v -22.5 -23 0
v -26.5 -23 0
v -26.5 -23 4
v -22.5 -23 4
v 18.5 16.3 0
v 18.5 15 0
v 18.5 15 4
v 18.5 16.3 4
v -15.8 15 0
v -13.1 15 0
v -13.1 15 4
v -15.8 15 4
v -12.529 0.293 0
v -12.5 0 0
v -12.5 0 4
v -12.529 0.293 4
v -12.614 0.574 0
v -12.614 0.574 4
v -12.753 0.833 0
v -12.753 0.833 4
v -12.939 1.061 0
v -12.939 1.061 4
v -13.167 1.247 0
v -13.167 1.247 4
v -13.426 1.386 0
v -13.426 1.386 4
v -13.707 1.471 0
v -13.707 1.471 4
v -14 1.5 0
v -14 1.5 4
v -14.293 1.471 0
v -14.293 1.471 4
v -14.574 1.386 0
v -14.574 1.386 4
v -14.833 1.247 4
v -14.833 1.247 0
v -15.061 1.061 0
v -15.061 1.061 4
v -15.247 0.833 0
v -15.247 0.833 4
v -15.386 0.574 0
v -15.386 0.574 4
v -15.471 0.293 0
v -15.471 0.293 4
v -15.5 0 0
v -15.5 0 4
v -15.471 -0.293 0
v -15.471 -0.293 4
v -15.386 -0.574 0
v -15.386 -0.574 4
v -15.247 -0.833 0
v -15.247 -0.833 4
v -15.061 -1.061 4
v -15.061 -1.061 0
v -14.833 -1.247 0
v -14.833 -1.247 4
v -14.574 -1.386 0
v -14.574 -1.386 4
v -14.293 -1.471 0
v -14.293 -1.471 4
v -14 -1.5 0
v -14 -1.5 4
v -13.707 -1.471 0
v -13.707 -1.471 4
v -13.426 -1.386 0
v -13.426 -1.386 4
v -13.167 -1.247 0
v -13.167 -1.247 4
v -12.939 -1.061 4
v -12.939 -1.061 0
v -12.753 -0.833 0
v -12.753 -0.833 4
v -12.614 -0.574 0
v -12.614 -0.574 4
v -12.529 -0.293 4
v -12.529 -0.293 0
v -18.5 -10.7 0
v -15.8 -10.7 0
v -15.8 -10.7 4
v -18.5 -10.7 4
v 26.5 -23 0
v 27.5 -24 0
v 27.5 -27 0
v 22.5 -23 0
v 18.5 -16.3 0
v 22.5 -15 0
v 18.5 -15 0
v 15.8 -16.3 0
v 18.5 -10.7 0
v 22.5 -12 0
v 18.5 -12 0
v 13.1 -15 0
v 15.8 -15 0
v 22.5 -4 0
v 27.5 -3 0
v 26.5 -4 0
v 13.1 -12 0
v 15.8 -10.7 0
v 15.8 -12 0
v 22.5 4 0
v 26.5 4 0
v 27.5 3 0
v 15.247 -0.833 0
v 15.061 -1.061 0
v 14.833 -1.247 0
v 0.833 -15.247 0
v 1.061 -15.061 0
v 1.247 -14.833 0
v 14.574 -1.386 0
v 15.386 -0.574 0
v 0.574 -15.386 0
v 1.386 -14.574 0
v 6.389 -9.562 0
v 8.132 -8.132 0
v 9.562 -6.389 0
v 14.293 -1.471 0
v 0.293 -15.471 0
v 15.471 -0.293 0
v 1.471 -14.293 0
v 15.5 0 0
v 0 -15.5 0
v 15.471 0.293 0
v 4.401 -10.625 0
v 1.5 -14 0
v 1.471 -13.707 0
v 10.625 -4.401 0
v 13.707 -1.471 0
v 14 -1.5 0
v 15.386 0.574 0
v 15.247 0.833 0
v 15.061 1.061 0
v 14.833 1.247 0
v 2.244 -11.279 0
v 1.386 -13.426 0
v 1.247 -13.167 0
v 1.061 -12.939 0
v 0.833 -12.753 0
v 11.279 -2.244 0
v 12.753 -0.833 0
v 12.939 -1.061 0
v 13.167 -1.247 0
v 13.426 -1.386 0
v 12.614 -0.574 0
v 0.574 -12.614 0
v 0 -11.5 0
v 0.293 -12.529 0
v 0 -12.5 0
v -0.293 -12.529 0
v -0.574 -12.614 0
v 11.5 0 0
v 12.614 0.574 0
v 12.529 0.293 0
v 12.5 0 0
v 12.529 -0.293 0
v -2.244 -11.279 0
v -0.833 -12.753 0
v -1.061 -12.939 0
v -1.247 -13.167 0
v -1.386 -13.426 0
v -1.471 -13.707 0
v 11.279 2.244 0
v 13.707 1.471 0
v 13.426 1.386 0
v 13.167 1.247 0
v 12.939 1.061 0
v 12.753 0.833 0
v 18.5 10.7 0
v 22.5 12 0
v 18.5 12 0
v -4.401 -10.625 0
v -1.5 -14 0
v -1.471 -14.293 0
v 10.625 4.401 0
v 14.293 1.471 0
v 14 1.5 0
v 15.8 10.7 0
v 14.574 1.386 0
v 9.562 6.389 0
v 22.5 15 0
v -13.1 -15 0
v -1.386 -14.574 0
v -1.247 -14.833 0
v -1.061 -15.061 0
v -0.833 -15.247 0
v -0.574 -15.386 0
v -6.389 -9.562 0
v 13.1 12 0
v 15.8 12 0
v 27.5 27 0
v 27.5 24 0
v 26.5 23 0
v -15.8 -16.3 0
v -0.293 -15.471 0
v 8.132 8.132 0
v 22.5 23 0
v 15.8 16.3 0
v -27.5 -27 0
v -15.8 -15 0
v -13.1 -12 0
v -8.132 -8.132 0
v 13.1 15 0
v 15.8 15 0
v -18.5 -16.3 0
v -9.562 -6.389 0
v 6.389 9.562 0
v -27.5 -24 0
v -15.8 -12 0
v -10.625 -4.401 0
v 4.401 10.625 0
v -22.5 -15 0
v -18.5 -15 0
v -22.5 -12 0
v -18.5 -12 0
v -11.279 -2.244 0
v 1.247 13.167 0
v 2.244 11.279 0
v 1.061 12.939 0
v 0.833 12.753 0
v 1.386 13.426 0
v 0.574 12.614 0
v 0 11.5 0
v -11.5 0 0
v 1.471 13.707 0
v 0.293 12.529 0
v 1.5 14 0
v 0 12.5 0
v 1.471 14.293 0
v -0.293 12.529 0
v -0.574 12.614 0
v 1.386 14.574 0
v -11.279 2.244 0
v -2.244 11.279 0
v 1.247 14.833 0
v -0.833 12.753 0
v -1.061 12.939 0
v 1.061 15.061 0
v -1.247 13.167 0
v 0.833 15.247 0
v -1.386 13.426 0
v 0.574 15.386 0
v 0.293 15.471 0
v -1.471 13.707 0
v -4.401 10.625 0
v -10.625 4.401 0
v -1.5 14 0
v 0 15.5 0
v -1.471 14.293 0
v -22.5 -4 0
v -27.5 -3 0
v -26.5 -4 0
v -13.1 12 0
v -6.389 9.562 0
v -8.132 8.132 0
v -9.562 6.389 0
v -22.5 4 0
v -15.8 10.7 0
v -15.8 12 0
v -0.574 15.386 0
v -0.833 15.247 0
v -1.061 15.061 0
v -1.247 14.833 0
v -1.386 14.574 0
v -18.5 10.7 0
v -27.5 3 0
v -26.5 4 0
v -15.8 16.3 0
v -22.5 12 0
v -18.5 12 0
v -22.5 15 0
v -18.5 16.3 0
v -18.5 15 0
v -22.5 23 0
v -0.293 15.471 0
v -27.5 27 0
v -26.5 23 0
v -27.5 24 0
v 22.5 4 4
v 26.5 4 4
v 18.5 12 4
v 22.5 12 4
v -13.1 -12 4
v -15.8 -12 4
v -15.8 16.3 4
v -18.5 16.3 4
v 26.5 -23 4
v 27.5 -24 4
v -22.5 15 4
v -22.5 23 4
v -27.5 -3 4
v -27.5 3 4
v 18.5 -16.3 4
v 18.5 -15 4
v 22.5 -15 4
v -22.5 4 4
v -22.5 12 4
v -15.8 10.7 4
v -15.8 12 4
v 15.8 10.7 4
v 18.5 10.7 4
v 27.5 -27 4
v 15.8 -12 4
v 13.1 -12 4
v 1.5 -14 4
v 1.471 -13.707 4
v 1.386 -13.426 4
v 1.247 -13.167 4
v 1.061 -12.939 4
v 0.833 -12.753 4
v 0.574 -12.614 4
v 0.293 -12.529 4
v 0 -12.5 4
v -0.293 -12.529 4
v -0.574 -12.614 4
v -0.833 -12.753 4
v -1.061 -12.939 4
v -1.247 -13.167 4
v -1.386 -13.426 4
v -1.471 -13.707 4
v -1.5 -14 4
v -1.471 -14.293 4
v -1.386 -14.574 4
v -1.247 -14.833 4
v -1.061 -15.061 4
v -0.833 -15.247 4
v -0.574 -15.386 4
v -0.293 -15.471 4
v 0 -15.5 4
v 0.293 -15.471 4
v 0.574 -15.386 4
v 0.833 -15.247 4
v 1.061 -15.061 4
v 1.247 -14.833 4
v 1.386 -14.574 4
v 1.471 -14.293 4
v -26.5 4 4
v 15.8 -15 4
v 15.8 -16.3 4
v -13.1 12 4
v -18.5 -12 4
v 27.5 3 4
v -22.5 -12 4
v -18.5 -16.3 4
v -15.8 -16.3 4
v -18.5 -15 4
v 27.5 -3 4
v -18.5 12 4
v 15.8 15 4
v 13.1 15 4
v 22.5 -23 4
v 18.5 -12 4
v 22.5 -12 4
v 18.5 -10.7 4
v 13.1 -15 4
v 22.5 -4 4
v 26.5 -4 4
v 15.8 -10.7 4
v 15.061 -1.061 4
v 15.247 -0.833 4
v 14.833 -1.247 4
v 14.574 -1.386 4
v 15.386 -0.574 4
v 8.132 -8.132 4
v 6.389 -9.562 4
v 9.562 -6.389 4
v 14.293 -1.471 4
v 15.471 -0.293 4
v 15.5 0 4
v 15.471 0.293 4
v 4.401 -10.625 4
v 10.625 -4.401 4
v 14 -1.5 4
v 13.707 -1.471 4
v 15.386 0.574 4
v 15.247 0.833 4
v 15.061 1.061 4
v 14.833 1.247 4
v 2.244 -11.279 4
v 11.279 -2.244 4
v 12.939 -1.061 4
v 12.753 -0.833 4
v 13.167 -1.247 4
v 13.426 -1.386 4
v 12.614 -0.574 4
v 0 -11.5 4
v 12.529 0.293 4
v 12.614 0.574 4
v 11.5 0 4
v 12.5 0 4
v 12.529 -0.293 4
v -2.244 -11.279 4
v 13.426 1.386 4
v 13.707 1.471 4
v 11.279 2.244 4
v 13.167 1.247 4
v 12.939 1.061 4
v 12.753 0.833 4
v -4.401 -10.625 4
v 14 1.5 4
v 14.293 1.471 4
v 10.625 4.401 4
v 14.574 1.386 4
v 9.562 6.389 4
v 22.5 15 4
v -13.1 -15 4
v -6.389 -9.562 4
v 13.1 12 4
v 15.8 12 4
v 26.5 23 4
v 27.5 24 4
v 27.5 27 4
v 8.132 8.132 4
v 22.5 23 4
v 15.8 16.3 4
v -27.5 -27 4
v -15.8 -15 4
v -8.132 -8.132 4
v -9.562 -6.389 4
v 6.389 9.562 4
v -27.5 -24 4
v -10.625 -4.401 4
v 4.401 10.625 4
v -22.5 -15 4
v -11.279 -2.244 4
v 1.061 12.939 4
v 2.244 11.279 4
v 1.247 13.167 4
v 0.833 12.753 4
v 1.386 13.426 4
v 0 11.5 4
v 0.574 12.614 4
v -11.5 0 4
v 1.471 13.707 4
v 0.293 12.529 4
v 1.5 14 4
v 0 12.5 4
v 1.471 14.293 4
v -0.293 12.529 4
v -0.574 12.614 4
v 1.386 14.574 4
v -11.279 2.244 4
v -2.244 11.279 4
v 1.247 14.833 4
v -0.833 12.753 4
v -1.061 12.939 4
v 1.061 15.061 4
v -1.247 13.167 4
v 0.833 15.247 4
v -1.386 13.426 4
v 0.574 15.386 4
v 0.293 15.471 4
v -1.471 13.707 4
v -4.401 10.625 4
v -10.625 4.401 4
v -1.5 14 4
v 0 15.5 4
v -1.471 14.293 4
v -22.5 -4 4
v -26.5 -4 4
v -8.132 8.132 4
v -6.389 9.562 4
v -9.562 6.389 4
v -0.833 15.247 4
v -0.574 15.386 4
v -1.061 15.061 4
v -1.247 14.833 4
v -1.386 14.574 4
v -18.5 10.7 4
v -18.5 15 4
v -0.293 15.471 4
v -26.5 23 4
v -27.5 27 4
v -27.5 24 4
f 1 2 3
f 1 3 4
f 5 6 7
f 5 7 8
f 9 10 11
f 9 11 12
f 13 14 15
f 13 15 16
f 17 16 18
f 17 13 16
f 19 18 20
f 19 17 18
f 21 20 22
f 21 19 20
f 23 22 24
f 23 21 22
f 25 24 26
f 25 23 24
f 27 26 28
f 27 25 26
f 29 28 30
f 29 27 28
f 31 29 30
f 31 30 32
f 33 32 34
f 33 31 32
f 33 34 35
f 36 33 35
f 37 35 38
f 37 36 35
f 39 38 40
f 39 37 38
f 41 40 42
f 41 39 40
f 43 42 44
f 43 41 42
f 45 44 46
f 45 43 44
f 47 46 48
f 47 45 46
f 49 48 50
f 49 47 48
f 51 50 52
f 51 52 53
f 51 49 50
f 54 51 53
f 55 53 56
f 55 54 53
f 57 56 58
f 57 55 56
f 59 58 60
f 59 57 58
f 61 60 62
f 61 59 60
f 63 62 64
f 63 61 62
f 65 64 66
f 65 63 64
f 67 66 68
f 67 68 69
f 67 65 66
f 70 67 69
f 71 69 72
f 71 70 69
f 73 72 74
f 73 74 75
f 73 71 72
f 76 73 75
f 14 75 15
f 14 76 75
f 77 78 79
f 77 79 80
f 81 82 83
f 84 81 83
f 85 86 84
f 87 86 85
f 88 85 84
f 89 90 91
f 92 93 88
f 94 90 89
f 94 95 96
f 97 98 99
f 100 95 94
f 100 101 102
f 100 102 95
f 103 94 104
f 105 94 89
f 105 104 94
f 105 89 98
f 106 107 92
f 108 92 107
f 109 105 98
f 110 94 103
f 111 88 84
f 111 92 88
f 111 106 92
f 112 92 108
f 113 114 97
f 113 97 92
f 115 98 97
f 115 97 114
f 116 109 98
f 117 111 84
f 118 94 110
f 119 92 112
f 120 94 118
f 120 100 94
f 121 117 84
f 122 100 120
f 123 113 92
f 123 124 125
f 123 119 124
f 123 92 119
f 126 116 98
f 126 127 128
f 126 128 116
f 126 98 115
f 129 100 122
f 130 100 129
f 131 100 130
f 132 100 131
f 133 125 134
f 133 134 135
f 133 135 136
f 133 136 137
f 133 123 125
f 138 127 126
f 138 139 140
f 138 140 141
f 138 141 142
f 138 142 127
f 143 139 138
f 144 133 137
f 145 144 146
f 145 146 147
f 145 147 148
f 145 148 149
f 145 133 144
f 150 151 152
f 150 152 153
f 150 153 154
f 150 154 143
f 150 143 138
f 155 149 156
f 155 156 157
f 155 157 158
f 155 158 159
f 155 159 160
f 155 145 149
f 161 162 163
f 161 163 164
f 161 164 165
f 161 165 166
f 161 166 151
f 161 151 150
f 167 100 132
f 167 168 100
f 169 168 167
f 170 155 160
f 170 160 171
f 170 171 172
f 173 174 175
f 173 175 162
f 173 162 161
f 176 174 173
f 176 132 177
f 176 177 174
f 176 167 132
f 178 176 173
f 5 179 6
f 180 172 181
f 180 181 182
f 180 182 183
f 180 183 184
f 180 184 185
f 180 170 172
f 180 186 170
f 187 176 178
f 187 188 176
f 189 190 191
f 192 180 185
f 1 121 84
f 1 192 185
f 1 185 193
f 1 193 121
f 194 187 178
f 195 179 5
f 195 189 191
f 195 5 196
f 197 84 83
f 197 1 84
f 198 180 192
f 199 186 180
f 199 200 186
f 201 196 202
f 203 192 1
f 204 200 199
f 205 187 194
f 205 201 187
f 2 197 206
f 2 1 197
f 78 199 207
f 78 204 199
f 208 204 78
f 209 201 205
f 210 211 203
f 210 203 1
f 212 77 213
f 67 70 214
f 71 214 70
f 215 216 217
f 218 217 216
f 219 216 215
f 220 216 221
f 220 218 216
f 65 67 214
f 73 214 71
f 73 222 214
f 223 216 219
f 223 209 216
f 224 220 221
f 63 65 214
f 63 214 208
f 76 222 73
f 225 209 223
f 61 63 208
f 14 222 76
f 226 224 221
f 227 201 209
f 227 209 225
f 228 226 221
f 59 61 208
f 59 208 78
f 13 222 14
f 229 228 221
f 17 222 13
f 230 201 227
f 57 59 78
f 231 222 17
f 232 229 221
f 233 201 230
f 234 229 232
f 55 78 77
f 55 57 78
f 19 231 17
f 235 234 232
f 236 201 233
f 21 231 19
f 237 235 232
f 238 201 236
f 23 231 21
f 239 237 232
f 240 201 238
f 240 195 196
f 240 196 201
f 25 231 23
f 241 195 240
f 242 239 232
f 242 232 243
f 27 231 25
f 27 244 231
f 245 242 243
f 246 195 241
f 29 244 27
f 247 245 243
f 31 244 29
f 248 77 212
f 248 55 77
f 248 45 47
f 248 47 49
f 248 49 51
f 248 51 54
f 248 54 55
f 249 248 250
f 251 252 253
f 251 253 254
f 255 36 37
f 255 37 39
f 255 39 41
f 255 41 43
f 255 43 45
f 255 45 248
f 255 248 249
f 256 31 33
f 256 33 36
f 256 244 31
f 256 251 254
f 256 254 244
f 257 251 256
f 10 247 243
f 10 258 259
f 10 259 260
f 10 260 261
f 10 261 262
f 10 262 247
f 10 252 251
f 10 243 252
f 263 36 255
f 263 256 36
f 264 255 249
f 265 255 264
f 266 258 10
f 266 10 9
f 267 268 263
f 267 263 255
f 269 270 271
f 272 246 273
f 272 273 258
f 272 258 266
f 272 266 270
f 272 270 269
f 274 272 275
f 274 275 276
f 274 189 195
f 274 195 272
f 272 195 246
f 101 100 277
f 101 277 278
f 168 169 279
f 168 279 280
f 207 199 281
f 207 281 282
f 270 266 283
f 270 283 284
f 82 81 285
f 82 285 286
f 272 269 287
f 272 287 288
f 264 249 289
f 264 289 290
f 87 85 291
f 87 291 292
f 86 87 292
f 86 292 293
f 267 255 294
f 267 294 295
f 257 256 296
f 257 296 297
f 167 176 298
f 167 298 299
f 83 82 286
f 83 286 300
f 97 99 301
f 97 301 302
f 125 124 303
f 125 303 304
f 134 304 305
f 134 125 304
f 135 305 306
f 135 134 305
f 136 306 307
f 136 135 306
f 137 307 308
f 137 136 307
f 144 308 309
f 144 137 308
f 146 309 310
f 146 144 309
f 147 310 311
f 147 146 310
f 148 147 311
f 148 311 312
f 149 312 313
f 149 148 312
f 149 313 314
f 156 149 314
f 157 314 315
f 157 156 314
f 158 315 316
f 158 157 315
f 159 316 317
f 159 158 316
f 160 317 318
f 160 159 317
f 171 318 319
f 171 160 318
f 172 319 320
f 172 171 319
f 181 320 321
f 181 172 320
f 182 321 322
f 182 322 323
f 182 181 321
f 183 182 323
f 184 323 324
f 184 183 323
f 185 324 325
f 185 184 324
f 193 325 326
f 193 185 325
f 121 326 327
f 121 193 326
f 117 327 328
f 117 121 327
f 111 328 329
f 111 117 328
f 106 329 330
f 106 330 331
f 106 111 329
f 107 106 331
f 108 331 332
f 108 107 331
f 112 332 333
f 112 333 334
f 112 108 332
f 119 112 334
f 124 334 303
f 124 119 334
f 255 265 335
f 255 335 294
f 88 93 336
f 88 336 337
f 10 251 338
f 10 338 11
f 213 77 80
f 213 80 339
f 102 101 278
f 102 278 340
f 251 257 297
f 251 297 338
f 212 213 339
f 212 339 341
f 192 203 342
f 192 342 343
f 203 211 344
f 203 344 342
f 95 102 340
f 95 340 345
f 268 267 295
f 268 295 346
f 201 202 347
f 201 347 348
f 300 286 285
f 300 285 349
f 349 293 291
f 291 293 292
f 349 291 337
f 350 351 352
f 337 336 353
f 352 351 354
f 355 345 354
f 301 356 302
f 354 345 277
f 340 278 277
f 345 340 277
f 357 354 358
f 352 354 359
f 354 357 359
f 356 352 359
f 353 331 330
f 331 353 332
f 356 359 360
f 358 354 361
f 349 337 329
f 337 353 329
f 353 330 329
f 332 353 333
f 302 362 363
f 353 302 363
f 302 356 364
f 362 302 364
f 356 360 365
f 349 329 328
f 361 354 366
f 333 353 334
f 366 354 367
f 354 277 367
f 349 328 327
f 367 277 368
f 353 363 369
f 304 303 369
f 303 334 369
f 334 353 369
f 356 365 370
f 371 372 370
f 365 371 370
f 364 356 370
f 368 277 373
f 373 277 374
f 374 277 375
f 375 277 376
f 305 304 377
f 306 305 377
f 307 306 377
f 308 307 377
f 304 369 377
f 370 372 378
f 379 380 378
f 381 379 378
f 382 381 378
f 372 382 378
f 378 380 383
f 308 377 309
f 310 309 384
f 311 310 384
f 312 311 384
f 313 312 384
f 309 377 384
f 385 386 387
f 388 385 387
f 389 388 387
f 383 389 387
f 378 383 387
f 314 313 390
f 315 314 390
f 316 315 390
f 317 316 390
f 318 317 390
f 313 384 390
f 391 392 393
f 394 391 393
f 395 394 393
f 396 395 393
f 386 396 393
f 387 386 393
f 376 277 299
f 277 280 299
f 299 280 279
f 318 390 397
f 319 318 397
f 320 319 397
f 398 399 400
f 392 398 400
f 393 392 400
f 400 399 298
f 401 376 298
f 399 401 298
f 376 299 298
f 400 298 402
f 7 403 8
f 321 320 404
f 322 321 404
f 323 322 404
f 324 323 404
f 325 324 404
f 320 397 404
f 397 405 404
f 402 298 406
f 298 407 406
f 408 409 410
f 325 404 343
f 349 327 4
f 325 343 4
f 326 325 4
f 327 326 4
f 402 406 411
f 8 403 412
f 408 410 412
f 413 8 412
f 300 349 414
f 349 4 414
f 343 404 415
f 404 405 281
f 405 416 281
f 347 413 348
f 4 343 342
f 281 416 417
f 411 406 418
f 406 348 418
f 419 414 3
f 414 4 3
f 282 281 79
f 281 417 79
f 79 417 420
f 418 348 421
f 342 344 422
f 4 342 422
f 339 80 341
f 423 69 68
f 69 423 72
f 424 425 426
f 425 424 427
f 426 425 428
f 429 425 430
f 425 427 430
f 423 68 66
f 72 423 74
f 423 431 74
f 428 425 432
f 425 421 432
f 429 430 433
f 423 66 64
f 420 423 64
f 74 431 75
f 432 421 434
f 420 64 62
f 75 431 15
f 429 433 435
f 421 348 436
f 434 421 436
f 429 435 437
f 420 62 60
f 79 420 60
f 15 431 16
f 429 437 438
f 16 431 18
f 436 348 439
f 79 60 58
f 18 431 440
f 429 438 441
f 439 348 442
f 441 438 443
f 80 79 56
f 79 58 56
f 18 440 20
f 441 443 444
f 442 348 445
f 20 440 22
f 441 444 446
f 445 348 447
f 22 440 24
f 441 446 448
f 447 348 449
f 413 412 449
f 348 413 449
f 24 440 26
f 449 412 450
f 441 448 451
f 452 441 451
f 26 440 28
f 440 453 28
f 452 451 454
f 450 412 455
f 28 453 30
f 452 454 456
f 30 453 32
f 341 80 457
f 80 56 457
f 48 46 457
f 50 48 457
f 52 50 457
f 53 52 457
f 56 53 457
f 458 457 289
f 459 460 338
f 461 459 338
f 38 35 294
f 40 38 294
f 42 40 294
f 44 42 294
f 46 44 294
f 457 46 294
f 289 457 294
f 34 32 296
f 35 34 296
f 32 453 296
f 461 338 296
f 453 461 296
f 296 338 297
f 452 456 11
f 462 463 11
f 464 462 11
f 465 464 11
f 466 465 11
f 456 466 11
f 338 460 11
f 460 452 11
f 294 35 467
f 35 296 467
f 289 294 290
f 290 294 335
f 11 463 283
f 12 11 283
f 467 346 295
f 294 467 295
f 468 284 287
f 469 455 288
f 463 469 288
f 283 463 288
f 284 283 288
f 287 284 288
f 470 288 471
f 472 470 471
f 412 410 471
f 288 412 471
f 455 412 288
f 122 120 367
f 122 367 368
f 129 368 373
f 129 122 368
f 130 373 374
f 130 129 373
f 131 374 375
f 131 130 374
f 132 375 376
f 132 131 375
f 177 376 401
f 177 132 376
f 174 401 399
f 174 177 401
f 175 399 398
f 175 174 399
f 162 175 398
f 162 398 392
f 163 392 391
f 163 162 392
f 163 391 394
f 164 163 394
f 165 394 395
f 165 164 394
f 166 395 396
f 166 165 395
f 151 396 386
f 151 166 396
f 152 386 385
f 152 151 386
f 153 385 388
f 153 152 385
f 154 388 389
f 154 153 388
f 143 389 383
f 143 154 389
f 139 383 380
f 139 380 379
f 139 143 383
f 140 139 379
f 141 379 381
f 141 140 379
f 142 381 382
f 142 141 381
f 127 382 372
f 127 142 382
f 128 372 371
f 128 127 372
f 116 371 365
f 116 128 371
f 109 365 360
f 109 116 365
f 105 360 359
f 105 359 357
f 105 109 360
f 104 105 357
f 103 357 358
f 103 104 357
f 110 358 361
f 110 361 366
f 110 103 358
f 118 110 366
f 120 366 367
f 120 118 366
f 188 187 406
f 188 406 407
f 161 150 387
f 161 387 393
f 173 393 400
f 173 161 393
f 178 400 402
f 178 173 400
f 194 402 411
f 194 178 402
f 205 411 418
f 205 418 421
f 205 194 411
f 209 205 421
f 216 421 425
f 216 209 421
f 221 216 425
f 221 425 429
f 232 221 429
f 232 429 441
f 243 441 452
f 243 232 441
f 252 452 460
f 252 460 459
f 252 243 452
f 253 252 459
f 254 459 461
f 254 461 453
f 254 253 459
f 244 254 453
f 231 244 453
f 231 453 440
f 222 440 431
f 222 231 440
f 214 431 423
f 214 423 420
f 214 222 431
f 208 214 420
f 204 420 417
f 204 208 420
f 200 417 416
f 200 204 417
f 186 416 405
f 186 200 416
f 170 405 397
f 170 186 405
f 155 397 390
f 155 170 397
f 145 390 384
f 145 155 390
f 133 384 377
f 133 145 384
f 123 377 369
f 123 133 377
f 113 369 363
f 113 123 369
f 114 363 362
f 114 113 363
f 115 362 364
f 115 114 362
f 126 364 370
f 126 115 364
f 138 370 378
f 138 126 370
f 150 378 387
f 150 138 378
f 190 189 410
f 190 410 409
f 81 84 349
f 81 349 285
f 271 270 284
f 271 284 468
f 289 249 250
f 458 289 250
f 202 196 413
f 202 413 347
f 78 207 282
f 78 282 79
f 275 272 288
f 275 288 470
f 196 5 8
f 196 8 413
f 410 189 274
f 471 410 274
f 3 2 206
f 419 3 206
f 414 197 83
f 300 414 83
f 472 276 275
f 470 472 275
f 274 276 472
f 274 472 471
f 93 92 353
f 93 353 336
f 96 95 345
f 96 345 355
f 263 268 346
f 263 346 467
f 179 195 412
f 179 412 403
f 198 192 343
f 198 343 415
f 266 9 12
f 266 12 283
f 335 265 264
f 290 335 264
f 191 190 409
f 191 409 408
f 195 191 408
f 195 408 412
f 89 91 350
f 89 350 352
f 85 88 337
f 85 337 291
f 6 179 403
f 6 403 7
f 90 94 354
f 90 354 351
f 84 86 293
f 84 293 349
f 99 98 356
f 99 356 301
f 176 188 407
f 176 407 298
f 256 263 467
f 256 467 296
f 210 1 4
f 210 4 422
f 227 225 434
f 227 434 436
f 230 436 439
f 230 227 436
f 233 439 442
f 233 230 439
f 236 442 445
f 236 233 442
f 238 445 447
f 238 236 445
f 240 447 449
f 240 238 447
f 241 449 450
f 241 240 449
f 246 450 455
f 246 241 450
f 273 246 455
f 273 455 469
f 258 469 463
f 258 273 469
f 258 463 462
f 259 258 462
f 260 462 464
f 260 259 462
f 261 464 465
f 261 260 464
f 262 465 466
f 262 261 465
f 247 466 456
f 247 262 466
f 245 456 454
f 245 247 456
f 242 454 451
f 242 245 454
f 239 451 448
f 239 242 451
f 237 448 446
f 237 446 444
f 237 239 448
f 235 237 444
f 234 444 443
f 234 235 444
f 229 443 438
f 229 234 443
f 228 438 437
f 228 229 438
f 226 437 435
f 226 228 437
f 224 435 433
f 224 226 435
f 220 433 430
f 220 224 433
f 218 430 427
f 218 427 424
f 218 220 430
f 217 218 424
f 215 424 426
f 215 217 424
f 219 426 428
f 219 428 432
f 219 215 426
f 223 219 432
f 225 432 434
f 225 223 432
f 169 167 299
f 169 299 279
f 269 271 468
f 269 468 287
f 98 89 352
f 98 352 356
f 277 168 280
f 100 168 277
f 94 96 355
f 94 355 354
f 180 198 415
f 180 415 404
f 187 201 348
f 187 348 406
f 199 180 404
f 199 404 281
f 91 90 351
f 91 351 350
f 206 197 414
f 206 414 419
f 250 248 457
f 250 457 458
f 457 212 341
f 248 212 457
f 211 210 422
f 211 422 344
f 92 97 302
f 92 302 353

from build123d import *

# Parameters (mm, degrees)
SKETCH_1_R          = 1.5
SKETCH_1_R_2        = 11.5
EXTRUDE_1_DEPTH     = 4
CUT_EXTRUDE_1_DEPTH = 4


with BuildPart() as part:
    # 草图1 → 凸台-拉伸1 (new body)
    with BuildSketch(Plane.XY):
        Polygon((22.5, -27), (-22.5, -27), (-27.5, -27), (-27.5, -23), (-22.5, -23), (-22.5, -15), (-18.5, -15), (-18.5, -16.3), (-15.8, -16.3), (-15.8, -15), (-13.1, -15), (-13.1, -12), (-15.8, -12), (-15.8, -10.7), (-18.5, -10.7), (-18.5, -12), (-22.5, -12), (-22.5, -4), (-27.5, -4), (-27.5, 4), (-22.5, 4), (-22.5, 12), (-18.5, 12), (-18.5, 10.7), (-15.8, 10.7), (-15.8, 12), (-13.1, 12), (-13.1, 15), (-15.8, 15), (-15.8, 16.3), (-18.5, 16.3), (-18.5, 15), (-22.5, 15), (-22.5, 23), (-27.5, 23), (-27.5, 27), (-22.5, 27), (22.5, 27), (27.5, 27), (27.5, 23), (22.5, 23), (22.5, 15), (18.5, 15), (18.5, 16.3), (15.8, 16.3), (15.8, 15), (13.1, 15), (13.1, 12), (15.8, 12), (15.8, 10.7), (18.5, 10.7), (18.5, 12), (22.5, 12), (22.5, 4), (27.5, 4), (27.5, -4), (22.5, -4), (22.5, -12), (18.5, -12), (18.5, -10.7), (15.8, -10.7), (15.8, -12), (13.1, -12), (13.1, -15), (15.8, -15), (15.8, -16.3), (18.5, -16.3), (18.5, -15), (22.5, -15), (22.5, -23), (27.5, -23), (27.5, -27), align=None)
        with Locations((14, 0)):
            Circle(SKETCH_1_R, mode=Mode.SUBTRACT)
        Circle(SKETCH_1_R_2, mode=Mode.SUBTRACT)
        with Locations((0, -14)):
            Circle(SKETCH_1_R, mode=Mode.SUBTRACT)
        with Locations((-14, 0)):
            Circle(SKETCH_1_R, mode=Mode.SUBTRACT)
        with Locations((0, 14)):
            Circle(SKETCH_1_R, mode=Mode.SUBTRACT)
    extrude(amount=EXTRUDE_1_DEPTH)

    # 草图4 → 切除-拉伸1 (cut)
    with BuildSketch(Plane(origin=(0, 0, 0), x_dir=(-1, 0, 0), z_dir=(0, 0, -1))):
        Polygon((-26.5, 4), (-27.5, 3), (-27.5, 4), align=None)
        Polygon((-27.5, -3), (-26.5, -4), (-27.5, -4), align=None)
        Polygon((-27.5, -23), (-26.5, -23), (-27.5, -24), align=None)
        Polygon((-27.5, 24), (-26.5, 23), (-27.5, 23), align=None)
        Polygon((27.5, 23), (27.5, 24), (26.5, 23), align=None)
        Polygon((27.5, -24), (27.5, -23), (26.5, -23), align=None)
        Polygon((27.5, -4), (27.5, -3), (26.5, -4), align=None)
        Polygon((27.5, 4), (26.5, 4), (27.5, 3), align=None)
    extrude(amount=-CUT_EXTRUDE_1_DEPTH, mode=Mode.SUBTRACT)


solid = part.part
